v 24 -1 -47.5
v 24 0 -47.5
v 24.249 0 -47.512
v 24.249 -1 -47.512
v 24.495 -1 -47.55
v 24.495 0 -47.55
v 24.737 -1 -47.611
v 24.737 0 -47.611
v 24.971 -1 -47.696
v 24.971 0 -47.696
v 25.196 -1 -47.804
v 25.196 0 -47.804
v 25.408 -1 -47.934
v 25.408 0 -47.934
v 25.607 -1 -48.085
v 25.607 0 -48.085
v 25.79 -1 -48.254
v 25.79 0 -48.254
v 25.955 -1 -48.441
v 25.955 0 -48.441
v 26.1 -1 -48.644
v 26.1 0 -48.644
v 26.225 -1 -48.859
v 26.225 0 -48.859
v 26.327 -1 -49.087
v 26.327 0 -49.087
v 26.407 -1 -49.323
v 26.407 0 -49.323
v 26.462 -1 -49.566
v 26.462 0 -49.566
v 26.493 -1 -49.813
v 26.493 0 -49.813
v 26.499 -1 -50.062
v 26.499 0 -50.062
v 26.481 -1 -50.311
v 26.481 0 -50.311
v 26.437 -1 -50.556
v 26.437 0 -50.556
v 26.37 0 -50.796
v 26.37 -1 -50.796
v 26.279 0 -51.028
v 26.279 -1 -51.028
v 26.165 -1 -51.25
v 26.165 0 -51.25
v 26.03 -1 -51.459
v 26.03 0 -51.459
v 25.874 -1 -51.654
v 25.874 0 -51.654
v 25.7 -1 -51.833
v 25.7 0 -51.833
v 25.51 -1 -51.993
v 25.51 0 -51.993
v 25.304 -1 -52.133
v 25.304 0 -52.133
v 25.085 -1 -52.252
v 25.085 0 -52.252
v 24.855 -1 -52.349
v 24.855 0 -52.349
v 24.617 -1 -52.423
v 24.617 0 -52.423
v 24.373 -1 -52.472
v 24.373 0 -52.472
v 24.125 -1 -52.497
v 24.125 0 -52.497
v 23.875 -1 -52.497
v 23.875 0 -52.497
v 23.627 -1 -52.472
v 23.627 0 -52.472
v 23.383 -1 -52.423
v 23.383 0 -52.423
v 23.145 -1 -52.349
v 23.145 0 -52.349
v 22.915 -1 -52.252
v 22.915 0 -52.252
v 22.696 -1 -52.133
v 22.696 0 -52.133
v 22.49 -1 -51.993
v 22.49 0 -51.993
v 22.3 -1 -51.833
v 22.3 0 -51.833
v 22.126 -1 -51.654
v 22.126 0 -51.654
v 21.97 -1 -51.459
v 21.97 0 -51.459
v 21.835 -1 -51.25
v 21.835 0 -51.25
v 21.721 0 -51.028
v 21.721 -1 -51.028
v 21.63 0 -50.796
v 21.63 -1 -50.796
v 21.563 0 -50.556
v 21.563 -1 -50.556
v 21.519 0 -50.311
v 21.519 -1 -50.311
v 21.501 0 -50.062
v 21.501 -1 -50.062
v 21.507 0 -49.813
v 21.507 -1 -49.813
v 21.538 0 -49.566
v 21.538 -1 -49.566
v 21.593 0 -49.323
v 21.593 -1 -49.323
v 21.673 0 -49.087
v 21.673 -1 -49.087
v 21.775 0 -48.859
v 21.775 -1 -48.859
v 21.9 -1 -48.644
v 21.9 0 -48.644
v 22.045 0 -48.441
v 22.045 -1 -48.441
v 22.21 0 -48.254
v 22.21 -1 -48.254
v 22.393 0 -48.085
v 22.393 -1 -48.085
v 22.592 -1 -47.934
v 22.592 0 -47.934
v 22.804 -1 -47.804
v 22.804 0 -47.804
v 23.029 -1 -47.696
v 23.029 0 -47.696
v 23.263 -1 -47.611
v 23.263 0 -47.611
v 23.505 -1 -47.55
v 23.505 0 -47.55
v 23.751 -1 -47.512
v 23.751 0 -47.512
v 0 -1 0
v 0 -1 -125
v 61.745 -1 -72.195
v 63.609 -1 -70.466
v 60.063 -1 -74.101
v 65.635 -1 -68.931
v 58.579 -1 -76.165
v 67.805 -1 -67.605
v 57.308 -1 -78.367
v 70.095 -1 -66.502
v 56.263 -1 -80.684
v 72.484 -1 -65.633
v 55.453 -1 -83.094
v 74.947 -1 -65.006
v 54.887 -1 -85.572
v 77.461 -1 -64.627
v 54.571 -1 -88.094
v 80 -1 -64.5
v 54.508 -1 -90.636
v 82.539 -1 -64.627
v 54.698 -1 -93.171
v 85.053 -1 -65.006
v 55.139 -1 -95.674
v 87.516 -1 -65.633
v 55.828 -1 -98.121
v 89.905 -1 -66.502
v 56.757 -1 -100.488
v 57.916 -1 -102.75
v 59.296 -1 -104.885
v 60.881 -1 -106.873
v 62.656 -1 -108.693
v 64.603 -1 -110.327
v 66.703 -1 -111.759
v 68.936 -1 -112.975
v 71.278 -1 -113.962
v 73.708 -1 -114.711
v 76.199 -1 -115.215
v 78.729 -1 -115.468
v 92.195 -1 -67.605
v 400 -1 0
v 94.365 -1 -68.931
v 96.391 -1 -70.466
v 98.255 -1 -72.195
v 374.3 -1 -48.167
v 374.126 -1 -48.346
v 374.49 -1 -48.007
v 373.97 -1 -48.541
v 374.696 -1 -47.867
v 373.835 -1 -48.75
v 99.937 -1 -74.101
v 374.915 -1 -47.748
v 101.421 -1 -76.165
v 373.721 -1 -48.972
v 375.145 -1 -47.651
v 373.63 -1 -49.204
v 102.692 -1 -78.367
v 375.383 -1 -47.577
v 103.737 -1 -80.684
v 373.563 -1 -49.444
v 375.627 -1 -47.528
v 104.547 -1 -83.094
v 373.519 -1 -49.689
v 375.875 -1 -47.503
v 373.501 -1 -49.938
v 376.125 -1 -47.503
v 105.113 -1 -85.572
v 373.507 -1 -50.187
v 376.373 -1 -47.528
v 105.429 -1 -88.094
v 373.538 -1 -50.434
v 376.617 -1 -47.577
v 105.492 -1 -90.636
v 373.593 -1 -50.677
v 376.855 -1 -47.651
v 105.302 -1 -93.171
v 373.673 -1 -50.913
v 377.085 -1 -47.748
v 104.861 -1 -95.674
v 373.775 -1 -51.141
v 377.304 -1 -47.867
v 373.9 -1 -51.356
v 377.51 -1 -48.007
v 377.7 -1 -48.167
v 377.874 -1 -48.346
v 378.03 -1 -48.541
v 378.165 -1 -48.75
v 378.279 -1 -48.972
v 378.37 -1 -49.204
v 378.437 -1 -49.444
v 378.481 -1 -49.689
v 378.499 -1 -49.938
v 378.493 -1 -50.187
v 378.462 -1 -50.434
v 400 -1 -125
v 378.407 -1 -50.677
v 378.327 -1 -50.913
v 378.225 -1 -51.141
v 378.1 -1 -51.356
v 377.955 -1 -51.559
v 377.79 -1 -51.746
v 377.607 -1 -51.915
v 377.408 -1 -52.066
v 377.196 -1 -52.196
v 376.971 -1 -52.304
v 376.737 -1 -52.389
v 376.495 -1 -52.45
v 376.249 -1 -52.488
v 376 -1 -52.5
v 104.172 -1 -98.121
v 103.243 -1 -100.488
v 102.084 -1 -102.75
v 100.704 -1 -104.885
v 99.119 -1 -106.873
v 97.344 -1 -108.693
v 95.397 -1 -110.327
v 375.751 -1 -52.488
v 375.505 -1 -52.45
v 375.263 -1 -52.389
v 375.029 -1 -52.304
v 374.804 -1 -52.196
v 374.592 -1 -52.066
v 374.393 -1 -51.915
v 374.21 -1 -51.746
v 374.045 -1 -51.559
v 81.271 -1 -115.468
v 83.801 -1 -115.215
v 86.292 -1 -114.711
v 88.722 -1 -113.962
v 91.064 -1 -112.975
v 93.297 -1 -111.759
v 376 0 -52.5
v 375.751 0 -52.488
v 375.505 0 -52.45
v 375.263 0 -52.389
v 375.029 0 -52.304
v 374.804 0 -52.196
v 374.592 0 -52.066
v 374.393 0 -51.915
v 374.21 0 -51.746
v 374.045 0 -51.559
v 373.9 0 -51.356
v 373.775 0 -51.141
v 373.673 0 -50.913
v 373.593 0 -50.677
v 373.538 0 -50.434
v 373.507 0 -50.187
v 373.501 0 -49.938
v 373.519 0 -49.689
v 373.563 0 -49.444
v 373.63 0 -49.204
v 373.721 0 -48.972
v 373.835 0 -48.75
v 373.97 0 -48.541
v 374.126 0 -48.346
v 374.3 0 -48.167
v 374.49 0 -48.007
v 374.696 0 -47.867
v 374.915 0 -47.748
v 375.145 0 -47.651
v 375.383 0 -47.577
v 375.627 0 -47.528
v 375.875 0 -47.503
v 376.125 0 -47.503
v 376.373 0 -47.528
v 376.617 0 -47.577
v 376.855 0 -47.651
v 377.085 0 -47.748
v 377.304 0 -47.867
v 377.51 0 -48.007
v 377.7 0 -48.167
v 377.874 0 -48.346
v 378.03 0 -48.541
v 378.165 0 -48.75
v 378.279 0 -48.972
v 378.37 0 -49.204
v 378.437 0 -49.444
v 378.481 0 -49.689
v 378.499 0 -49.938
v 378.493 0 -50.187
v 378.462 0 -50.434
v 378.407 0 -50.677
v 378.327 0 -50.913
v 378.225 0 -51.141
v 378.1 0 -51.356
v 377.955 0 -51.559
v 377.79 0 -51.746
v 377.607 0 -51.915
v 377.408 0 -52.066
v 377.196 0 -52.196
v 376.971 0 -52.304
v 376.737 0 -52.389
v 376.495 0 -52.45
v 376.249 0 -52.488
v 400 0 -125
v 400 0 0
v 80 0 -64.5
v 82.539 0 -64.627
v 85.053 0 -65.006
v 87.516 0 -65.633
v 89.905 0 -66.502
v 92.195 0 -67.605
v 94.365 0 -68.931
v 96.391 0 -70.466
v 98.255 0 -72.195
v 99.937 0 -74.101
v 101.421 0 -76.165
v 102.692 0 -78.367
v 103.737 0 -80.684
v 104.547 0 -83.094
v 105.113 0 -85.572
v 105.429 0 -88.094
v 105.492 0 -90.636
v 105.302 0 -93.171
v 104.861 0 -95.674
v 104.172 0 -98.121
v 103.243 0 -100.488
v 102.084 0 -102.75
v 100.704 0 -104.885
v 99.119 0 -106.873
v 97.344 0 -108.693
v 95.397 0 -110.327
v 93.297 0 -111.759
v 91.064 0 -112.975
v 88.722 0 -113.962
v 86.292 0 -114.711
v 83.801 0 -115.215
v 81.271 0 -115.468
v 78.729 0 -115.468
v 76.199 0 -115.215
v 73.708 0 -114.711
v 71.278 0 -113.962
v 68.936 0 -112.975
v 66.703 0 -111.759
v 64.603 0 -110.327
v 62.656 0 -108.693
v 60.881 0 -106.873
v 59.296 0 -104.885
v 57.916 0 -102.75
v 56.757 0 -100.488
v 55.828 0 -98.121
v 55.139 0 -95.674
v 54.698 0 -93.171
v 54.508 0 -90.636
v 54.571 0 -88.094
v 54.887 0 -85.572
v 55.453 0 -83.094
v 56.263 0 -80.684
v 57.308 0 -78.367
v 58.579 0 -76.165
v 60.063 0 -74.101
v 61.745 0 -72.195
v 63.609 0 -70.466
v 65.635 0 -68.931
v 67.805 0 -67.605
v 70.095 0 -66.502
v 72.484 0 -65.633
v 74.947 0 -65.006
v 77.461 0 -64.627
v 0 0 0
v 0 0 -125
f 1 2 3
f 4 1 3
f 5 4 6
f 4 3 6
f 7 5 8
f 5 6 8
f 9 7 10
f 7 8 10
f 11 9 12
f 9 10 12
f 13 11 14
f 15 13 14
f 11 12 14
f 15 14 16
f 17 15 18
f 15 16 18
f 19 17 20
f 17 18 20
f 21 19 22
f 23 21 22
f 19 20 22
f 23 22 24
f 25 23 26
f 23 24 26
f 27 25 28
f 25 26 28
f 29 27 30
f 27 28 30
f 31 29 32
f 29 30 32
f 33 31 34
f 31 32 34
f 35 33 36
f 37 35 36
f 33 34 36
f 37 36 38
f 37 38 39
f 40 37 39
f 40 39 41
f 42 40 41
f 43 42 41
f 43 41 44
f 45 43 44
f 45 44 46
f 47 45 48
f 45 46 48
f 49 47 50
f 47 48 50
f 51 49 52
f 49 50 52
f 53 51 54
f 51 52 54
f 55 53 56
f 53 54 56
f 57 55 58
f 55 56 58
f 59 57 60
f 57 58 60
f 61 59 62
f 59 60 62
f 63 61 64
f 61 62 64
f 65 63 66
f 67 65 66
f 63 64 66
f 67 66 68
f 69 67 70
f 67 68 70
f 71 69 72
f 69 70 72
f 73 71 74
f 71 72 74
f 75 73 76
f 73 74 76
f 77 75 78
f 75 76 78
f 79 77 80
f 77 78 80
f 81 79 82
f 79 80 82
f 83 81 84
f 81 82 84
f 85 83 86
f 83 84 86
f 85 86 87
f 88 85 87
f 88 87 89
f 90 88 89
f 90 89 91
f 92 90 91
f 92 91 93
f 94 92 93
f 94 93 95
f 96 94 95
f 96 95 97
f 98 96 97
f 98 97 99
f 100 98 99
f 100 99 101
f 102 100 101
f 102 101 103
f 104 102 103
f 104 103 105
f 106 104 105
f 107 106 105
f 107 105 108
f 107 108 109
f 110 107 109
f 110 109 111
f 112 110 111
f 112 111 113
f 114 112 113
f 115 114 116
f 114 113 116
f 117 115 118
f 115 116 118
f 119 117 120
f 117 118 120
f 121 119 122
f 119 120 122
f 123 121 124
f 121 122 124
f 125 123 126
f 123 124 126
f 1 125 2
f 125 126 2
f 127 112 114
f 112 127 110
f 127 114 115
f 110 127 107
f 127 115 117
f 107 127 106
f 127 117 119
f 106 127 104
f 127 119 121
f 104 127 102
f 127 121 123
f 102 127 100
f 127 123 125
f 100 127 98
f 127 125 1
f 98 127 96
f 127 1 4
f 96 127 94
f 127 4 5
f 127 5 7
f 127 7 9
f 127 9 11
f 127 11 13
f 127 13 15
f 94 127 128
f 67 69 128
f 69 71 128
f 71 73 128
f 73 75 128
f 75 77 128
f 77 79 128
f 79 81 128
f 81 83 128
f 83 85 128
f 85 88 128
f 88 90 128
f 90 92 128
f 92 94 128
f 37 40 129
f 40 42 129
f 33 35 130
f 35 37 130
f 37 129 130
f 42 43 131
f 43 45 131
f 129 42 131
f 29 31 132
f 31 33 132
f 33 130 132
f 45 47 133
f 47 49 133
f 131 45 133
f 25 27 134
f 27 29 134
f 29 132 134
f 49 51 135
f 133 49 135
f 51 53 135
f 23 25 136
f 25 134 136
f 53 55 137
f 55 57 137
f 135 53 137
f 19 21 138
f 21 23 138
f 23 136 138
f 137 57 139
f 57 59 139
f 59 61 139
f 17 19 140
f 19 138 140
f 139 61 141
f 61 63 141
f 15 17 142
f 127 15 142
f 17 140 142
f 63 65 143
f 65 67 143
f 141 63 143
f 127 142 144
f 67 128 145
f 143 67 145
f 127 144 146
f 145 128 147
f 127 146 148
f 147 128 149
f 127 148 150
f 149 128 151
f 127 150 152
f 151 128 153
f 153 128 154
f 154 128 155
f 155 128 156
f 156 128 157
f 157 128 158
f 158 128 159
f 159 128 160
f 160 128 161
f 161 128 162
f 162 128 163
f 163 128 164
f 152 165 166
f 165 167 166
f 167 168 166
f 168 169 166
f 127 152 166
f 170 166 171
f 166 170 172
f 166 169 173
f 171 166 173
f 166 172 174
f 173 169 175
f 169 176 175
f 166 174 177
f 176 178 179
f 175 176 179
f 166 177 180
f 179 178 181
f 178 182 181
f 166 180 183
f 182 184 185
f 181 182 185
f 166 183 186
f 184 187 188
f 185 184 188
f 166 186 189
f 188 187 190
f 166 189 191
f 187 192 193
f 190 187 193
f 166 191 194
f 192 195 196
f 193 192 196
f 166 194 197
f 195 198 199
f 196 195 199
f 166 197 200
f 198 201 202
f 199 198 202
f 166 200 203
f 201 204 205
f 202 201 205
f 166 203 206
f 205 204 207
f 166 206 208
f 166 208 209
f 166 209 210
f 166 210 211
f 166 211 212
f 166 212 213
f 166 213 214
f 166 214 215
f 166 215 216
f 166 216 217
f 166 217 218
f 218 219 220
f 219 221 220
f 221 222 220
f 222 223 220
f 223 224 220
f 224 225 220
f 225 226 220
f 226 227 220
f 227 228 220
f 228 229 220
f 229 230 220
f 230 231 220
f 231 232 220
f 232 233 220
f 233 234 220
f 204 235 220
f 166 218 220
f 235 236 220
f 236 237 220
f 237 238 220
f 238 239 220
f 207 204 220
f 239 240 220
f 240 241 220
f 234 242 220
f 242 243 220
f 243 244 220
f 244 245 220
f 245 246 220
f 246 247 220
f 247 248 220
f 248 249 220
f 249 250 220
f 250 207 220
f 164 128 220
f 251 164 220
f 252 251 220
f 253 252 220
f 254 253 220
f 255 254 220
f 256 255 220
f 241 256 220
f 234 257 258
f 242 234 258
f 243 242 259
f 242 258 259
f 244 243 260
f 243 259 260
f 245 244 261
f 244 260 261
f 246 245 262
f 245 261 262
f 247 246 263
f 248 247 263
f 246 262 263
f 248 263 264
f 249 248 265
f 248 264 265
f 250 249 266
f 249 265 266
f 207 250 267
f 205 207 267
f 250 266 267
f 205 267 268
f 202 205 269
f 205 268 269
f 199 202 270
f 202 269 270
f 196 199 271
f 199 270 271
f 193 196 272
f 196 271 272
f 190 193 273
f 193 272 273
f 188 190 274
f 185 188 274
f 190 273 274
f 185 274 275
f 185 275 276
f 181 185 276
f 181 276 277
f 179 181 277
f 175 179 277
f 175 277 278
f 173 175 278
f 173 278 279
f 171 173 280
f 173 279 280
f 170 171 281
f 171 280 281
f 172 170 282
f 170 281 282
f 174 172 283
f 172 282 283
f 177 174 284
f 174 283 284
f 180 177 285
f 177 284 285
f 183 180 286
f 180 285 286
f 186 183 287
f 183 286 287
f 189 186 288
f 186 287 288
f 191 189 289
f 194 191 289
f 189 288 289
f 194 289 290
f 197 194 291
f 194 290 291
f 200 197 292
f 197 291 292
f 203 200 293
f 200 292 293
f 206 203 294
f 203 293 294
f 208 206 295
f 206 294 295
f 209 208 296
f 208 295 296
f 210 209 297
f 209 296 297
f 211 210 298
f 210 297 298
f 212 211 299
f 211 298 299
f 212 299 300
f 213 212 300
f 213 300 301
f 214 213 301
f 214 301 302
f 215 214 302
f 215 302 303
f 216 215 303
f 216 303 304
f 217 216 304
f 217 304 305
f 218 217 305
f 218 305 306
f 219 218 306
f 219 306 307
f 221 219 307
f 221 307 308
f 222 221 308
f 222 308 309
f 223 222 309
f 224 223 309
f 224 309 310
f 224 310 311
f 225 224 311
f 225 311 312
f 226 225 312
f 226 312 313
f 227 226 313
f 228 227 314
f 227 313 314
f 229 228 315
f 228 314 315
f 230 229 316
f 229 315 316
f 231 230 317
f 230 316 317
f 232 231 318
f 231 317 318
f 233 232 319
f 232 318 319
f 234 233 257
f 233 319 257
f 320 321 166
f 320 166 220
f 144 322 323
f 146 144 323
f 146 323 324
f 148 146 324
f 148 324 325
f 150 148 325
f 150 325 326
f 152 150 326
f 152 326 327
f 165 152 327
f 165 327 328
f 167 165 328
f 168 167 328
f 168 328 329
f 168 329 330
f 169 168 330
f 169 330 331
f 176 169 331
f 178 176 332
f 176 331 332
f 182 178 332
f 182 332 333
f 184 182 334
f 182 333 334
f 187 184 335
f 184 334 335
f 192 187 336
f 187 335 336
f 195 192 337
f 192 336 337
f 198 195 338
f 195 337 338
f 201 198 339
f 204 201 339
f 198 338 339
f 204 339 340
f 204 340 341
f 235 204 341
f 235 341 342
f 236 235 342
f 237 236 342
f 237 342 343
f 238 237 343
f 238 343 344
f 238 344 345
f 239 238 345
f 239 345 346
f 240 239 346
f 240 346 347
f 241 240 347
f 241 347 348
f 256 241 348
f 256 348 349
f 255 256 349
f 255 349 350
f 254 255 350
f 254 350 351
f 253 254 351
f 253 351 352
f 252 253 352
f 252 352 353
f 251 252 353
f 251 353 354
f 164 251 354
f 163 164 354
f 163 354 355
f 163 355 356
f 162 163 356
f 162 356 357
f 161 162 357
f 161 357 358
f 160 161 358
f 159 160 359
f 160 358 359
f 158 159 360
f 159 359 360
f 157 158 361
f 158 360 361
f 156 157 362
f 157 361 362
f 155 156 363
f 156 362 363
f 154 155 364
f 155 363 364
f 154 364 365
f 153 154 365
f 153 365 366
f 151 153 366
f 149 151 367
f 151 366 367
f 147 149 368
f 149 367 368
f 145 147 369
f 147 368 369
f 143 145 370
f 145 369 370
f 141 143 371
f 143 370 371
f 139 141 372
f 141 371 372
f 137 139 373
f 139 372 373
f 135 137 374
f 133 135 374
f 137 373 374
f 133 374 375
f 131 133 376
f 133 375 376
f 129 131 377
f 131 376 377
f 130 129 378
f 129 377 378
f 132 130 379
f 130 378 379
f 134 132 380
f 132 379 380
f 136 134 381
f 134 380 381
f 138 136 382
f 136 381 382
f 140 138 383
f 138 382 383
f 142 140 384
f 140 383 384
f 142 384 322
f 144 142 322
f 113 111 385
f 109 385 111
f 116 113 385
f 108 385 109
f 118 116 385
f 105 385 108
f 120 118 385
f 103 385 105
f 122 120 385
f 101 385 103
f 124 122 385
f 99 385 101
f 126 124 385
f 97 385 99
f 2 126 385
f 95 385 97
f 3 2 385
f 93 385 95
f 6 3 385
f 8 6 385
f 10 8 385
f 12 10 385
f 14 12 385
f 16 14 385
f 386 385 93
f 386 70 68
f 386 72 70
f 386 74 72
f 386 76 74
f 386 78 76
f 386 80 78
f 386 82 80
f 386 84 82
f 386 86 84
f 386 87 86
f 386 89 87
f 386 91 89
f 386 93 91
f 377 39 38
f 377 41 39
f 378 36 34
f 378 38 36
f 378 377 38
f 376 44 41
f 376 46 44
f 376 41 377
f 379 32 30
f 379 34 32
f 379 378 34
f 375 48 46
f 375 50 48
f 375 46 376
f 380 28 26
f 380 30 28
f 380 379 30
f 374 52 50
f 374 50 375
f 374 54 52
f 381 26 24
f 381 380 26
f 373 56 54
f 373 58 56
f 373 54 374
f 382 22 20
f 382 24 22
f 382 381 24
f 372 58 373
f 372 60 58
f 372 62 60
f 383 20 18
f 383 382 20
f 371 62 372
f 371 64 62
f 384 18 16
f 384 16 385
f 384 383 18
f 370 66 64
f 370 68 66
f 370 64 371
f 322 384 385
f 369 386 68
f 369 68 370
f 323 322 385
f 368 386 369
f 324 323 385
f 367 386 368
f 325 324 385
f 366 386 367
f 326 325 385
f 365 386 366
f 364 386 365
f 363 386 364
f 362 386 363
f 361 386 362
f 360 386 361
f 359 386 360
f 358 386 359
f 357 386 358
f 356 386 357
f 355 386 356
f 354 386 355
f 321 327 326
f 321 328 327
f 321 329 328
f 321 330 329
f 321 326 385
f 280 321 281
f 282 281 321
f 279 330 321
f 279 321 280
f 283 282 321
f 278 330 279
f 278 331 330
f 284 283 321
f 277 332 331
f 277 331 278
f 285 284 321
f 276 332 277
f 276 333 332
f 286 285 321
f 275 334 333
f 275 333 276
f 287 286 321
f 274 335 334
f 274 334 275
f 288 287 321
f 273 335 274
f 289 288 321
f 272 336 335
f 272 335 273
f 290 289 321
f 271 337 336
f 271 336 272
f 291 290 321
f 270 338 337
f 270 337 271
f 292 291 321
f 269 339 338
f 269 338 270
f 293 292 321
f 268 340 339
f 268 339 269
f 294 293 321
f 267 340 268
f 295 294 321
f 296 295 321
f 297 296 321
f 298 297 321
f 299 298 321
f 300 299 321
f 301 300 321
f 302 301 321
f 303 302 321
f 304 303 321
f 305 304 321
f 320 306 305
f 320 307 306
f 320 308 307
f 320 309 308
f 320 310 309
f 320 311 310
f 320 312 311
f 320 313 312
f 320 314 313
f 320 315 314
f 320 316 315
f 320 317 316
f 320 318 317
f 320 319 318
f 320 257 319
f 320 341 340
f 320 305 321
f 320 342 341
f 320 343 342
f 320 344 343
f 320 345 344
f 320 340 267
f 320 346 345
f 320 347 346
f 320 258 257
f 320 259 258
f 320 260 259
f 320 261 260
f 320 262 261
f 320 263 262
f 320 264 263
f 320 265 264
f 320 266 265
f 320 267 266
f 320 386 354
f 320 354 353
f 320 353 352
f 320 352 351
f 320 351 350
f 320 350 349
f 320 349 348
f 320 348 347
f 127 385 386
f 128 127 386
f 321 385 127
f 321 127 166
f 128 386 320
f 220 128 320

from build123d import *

# Parameters (mm, degrees)
SKETCH_2_W             = 400
SKETCH_2_H             = 125
SKETCH_2_R             = 2.5
SM_BASE_FLANGE_1_DEPTH = 1
SKETCH_3_R             = 25.5
CUT_EXTRUDE_1_DEPTH    = 420.077558454


# Sheet-metal steps are written as plain solids
with BuildPart() as part:
    # Sketch 2 → Базовая кромка1 (new body)
    with BuildSketch(Plane(origin=(0, 0, 0), x_dir=(1, 0, 0), z_dir=(0, 1, 0))):
        with Locations((200, 62.5)):
            Rectangle(SKETCH_2_W, SKETCH_2_H)
        with Locations(Location((24, 50, 0), (0, 0, 270))):
            Circle(SKETCH_2_R, mode=Mode.SUBTRACT)
        with Locations(Location((376, 50, 0), (0, 0, 90))):
            Circle(SKETCH_2_R, mode=Mode.SUBTRACT)
    extrude(amount=-SM_BASE_FLANGE_1_DEPTH)

    # Эскиз3 → Вырез-Вытянуть1 (cut, through all)
    with BuildSketch(Plane(origin=(0, 0, 0), x_dir=(1, 0, 0), z_dir=(0, 1, 0))):
        with Locations(Location((80, 90, 0), (0, 0, 270))):
            Circle(SKETCH_3_R)
    extrude(amount=-CUT_EXTRUDE_1_DEPTH, mode=Mode.SUBTRACT)


solid = part.part
